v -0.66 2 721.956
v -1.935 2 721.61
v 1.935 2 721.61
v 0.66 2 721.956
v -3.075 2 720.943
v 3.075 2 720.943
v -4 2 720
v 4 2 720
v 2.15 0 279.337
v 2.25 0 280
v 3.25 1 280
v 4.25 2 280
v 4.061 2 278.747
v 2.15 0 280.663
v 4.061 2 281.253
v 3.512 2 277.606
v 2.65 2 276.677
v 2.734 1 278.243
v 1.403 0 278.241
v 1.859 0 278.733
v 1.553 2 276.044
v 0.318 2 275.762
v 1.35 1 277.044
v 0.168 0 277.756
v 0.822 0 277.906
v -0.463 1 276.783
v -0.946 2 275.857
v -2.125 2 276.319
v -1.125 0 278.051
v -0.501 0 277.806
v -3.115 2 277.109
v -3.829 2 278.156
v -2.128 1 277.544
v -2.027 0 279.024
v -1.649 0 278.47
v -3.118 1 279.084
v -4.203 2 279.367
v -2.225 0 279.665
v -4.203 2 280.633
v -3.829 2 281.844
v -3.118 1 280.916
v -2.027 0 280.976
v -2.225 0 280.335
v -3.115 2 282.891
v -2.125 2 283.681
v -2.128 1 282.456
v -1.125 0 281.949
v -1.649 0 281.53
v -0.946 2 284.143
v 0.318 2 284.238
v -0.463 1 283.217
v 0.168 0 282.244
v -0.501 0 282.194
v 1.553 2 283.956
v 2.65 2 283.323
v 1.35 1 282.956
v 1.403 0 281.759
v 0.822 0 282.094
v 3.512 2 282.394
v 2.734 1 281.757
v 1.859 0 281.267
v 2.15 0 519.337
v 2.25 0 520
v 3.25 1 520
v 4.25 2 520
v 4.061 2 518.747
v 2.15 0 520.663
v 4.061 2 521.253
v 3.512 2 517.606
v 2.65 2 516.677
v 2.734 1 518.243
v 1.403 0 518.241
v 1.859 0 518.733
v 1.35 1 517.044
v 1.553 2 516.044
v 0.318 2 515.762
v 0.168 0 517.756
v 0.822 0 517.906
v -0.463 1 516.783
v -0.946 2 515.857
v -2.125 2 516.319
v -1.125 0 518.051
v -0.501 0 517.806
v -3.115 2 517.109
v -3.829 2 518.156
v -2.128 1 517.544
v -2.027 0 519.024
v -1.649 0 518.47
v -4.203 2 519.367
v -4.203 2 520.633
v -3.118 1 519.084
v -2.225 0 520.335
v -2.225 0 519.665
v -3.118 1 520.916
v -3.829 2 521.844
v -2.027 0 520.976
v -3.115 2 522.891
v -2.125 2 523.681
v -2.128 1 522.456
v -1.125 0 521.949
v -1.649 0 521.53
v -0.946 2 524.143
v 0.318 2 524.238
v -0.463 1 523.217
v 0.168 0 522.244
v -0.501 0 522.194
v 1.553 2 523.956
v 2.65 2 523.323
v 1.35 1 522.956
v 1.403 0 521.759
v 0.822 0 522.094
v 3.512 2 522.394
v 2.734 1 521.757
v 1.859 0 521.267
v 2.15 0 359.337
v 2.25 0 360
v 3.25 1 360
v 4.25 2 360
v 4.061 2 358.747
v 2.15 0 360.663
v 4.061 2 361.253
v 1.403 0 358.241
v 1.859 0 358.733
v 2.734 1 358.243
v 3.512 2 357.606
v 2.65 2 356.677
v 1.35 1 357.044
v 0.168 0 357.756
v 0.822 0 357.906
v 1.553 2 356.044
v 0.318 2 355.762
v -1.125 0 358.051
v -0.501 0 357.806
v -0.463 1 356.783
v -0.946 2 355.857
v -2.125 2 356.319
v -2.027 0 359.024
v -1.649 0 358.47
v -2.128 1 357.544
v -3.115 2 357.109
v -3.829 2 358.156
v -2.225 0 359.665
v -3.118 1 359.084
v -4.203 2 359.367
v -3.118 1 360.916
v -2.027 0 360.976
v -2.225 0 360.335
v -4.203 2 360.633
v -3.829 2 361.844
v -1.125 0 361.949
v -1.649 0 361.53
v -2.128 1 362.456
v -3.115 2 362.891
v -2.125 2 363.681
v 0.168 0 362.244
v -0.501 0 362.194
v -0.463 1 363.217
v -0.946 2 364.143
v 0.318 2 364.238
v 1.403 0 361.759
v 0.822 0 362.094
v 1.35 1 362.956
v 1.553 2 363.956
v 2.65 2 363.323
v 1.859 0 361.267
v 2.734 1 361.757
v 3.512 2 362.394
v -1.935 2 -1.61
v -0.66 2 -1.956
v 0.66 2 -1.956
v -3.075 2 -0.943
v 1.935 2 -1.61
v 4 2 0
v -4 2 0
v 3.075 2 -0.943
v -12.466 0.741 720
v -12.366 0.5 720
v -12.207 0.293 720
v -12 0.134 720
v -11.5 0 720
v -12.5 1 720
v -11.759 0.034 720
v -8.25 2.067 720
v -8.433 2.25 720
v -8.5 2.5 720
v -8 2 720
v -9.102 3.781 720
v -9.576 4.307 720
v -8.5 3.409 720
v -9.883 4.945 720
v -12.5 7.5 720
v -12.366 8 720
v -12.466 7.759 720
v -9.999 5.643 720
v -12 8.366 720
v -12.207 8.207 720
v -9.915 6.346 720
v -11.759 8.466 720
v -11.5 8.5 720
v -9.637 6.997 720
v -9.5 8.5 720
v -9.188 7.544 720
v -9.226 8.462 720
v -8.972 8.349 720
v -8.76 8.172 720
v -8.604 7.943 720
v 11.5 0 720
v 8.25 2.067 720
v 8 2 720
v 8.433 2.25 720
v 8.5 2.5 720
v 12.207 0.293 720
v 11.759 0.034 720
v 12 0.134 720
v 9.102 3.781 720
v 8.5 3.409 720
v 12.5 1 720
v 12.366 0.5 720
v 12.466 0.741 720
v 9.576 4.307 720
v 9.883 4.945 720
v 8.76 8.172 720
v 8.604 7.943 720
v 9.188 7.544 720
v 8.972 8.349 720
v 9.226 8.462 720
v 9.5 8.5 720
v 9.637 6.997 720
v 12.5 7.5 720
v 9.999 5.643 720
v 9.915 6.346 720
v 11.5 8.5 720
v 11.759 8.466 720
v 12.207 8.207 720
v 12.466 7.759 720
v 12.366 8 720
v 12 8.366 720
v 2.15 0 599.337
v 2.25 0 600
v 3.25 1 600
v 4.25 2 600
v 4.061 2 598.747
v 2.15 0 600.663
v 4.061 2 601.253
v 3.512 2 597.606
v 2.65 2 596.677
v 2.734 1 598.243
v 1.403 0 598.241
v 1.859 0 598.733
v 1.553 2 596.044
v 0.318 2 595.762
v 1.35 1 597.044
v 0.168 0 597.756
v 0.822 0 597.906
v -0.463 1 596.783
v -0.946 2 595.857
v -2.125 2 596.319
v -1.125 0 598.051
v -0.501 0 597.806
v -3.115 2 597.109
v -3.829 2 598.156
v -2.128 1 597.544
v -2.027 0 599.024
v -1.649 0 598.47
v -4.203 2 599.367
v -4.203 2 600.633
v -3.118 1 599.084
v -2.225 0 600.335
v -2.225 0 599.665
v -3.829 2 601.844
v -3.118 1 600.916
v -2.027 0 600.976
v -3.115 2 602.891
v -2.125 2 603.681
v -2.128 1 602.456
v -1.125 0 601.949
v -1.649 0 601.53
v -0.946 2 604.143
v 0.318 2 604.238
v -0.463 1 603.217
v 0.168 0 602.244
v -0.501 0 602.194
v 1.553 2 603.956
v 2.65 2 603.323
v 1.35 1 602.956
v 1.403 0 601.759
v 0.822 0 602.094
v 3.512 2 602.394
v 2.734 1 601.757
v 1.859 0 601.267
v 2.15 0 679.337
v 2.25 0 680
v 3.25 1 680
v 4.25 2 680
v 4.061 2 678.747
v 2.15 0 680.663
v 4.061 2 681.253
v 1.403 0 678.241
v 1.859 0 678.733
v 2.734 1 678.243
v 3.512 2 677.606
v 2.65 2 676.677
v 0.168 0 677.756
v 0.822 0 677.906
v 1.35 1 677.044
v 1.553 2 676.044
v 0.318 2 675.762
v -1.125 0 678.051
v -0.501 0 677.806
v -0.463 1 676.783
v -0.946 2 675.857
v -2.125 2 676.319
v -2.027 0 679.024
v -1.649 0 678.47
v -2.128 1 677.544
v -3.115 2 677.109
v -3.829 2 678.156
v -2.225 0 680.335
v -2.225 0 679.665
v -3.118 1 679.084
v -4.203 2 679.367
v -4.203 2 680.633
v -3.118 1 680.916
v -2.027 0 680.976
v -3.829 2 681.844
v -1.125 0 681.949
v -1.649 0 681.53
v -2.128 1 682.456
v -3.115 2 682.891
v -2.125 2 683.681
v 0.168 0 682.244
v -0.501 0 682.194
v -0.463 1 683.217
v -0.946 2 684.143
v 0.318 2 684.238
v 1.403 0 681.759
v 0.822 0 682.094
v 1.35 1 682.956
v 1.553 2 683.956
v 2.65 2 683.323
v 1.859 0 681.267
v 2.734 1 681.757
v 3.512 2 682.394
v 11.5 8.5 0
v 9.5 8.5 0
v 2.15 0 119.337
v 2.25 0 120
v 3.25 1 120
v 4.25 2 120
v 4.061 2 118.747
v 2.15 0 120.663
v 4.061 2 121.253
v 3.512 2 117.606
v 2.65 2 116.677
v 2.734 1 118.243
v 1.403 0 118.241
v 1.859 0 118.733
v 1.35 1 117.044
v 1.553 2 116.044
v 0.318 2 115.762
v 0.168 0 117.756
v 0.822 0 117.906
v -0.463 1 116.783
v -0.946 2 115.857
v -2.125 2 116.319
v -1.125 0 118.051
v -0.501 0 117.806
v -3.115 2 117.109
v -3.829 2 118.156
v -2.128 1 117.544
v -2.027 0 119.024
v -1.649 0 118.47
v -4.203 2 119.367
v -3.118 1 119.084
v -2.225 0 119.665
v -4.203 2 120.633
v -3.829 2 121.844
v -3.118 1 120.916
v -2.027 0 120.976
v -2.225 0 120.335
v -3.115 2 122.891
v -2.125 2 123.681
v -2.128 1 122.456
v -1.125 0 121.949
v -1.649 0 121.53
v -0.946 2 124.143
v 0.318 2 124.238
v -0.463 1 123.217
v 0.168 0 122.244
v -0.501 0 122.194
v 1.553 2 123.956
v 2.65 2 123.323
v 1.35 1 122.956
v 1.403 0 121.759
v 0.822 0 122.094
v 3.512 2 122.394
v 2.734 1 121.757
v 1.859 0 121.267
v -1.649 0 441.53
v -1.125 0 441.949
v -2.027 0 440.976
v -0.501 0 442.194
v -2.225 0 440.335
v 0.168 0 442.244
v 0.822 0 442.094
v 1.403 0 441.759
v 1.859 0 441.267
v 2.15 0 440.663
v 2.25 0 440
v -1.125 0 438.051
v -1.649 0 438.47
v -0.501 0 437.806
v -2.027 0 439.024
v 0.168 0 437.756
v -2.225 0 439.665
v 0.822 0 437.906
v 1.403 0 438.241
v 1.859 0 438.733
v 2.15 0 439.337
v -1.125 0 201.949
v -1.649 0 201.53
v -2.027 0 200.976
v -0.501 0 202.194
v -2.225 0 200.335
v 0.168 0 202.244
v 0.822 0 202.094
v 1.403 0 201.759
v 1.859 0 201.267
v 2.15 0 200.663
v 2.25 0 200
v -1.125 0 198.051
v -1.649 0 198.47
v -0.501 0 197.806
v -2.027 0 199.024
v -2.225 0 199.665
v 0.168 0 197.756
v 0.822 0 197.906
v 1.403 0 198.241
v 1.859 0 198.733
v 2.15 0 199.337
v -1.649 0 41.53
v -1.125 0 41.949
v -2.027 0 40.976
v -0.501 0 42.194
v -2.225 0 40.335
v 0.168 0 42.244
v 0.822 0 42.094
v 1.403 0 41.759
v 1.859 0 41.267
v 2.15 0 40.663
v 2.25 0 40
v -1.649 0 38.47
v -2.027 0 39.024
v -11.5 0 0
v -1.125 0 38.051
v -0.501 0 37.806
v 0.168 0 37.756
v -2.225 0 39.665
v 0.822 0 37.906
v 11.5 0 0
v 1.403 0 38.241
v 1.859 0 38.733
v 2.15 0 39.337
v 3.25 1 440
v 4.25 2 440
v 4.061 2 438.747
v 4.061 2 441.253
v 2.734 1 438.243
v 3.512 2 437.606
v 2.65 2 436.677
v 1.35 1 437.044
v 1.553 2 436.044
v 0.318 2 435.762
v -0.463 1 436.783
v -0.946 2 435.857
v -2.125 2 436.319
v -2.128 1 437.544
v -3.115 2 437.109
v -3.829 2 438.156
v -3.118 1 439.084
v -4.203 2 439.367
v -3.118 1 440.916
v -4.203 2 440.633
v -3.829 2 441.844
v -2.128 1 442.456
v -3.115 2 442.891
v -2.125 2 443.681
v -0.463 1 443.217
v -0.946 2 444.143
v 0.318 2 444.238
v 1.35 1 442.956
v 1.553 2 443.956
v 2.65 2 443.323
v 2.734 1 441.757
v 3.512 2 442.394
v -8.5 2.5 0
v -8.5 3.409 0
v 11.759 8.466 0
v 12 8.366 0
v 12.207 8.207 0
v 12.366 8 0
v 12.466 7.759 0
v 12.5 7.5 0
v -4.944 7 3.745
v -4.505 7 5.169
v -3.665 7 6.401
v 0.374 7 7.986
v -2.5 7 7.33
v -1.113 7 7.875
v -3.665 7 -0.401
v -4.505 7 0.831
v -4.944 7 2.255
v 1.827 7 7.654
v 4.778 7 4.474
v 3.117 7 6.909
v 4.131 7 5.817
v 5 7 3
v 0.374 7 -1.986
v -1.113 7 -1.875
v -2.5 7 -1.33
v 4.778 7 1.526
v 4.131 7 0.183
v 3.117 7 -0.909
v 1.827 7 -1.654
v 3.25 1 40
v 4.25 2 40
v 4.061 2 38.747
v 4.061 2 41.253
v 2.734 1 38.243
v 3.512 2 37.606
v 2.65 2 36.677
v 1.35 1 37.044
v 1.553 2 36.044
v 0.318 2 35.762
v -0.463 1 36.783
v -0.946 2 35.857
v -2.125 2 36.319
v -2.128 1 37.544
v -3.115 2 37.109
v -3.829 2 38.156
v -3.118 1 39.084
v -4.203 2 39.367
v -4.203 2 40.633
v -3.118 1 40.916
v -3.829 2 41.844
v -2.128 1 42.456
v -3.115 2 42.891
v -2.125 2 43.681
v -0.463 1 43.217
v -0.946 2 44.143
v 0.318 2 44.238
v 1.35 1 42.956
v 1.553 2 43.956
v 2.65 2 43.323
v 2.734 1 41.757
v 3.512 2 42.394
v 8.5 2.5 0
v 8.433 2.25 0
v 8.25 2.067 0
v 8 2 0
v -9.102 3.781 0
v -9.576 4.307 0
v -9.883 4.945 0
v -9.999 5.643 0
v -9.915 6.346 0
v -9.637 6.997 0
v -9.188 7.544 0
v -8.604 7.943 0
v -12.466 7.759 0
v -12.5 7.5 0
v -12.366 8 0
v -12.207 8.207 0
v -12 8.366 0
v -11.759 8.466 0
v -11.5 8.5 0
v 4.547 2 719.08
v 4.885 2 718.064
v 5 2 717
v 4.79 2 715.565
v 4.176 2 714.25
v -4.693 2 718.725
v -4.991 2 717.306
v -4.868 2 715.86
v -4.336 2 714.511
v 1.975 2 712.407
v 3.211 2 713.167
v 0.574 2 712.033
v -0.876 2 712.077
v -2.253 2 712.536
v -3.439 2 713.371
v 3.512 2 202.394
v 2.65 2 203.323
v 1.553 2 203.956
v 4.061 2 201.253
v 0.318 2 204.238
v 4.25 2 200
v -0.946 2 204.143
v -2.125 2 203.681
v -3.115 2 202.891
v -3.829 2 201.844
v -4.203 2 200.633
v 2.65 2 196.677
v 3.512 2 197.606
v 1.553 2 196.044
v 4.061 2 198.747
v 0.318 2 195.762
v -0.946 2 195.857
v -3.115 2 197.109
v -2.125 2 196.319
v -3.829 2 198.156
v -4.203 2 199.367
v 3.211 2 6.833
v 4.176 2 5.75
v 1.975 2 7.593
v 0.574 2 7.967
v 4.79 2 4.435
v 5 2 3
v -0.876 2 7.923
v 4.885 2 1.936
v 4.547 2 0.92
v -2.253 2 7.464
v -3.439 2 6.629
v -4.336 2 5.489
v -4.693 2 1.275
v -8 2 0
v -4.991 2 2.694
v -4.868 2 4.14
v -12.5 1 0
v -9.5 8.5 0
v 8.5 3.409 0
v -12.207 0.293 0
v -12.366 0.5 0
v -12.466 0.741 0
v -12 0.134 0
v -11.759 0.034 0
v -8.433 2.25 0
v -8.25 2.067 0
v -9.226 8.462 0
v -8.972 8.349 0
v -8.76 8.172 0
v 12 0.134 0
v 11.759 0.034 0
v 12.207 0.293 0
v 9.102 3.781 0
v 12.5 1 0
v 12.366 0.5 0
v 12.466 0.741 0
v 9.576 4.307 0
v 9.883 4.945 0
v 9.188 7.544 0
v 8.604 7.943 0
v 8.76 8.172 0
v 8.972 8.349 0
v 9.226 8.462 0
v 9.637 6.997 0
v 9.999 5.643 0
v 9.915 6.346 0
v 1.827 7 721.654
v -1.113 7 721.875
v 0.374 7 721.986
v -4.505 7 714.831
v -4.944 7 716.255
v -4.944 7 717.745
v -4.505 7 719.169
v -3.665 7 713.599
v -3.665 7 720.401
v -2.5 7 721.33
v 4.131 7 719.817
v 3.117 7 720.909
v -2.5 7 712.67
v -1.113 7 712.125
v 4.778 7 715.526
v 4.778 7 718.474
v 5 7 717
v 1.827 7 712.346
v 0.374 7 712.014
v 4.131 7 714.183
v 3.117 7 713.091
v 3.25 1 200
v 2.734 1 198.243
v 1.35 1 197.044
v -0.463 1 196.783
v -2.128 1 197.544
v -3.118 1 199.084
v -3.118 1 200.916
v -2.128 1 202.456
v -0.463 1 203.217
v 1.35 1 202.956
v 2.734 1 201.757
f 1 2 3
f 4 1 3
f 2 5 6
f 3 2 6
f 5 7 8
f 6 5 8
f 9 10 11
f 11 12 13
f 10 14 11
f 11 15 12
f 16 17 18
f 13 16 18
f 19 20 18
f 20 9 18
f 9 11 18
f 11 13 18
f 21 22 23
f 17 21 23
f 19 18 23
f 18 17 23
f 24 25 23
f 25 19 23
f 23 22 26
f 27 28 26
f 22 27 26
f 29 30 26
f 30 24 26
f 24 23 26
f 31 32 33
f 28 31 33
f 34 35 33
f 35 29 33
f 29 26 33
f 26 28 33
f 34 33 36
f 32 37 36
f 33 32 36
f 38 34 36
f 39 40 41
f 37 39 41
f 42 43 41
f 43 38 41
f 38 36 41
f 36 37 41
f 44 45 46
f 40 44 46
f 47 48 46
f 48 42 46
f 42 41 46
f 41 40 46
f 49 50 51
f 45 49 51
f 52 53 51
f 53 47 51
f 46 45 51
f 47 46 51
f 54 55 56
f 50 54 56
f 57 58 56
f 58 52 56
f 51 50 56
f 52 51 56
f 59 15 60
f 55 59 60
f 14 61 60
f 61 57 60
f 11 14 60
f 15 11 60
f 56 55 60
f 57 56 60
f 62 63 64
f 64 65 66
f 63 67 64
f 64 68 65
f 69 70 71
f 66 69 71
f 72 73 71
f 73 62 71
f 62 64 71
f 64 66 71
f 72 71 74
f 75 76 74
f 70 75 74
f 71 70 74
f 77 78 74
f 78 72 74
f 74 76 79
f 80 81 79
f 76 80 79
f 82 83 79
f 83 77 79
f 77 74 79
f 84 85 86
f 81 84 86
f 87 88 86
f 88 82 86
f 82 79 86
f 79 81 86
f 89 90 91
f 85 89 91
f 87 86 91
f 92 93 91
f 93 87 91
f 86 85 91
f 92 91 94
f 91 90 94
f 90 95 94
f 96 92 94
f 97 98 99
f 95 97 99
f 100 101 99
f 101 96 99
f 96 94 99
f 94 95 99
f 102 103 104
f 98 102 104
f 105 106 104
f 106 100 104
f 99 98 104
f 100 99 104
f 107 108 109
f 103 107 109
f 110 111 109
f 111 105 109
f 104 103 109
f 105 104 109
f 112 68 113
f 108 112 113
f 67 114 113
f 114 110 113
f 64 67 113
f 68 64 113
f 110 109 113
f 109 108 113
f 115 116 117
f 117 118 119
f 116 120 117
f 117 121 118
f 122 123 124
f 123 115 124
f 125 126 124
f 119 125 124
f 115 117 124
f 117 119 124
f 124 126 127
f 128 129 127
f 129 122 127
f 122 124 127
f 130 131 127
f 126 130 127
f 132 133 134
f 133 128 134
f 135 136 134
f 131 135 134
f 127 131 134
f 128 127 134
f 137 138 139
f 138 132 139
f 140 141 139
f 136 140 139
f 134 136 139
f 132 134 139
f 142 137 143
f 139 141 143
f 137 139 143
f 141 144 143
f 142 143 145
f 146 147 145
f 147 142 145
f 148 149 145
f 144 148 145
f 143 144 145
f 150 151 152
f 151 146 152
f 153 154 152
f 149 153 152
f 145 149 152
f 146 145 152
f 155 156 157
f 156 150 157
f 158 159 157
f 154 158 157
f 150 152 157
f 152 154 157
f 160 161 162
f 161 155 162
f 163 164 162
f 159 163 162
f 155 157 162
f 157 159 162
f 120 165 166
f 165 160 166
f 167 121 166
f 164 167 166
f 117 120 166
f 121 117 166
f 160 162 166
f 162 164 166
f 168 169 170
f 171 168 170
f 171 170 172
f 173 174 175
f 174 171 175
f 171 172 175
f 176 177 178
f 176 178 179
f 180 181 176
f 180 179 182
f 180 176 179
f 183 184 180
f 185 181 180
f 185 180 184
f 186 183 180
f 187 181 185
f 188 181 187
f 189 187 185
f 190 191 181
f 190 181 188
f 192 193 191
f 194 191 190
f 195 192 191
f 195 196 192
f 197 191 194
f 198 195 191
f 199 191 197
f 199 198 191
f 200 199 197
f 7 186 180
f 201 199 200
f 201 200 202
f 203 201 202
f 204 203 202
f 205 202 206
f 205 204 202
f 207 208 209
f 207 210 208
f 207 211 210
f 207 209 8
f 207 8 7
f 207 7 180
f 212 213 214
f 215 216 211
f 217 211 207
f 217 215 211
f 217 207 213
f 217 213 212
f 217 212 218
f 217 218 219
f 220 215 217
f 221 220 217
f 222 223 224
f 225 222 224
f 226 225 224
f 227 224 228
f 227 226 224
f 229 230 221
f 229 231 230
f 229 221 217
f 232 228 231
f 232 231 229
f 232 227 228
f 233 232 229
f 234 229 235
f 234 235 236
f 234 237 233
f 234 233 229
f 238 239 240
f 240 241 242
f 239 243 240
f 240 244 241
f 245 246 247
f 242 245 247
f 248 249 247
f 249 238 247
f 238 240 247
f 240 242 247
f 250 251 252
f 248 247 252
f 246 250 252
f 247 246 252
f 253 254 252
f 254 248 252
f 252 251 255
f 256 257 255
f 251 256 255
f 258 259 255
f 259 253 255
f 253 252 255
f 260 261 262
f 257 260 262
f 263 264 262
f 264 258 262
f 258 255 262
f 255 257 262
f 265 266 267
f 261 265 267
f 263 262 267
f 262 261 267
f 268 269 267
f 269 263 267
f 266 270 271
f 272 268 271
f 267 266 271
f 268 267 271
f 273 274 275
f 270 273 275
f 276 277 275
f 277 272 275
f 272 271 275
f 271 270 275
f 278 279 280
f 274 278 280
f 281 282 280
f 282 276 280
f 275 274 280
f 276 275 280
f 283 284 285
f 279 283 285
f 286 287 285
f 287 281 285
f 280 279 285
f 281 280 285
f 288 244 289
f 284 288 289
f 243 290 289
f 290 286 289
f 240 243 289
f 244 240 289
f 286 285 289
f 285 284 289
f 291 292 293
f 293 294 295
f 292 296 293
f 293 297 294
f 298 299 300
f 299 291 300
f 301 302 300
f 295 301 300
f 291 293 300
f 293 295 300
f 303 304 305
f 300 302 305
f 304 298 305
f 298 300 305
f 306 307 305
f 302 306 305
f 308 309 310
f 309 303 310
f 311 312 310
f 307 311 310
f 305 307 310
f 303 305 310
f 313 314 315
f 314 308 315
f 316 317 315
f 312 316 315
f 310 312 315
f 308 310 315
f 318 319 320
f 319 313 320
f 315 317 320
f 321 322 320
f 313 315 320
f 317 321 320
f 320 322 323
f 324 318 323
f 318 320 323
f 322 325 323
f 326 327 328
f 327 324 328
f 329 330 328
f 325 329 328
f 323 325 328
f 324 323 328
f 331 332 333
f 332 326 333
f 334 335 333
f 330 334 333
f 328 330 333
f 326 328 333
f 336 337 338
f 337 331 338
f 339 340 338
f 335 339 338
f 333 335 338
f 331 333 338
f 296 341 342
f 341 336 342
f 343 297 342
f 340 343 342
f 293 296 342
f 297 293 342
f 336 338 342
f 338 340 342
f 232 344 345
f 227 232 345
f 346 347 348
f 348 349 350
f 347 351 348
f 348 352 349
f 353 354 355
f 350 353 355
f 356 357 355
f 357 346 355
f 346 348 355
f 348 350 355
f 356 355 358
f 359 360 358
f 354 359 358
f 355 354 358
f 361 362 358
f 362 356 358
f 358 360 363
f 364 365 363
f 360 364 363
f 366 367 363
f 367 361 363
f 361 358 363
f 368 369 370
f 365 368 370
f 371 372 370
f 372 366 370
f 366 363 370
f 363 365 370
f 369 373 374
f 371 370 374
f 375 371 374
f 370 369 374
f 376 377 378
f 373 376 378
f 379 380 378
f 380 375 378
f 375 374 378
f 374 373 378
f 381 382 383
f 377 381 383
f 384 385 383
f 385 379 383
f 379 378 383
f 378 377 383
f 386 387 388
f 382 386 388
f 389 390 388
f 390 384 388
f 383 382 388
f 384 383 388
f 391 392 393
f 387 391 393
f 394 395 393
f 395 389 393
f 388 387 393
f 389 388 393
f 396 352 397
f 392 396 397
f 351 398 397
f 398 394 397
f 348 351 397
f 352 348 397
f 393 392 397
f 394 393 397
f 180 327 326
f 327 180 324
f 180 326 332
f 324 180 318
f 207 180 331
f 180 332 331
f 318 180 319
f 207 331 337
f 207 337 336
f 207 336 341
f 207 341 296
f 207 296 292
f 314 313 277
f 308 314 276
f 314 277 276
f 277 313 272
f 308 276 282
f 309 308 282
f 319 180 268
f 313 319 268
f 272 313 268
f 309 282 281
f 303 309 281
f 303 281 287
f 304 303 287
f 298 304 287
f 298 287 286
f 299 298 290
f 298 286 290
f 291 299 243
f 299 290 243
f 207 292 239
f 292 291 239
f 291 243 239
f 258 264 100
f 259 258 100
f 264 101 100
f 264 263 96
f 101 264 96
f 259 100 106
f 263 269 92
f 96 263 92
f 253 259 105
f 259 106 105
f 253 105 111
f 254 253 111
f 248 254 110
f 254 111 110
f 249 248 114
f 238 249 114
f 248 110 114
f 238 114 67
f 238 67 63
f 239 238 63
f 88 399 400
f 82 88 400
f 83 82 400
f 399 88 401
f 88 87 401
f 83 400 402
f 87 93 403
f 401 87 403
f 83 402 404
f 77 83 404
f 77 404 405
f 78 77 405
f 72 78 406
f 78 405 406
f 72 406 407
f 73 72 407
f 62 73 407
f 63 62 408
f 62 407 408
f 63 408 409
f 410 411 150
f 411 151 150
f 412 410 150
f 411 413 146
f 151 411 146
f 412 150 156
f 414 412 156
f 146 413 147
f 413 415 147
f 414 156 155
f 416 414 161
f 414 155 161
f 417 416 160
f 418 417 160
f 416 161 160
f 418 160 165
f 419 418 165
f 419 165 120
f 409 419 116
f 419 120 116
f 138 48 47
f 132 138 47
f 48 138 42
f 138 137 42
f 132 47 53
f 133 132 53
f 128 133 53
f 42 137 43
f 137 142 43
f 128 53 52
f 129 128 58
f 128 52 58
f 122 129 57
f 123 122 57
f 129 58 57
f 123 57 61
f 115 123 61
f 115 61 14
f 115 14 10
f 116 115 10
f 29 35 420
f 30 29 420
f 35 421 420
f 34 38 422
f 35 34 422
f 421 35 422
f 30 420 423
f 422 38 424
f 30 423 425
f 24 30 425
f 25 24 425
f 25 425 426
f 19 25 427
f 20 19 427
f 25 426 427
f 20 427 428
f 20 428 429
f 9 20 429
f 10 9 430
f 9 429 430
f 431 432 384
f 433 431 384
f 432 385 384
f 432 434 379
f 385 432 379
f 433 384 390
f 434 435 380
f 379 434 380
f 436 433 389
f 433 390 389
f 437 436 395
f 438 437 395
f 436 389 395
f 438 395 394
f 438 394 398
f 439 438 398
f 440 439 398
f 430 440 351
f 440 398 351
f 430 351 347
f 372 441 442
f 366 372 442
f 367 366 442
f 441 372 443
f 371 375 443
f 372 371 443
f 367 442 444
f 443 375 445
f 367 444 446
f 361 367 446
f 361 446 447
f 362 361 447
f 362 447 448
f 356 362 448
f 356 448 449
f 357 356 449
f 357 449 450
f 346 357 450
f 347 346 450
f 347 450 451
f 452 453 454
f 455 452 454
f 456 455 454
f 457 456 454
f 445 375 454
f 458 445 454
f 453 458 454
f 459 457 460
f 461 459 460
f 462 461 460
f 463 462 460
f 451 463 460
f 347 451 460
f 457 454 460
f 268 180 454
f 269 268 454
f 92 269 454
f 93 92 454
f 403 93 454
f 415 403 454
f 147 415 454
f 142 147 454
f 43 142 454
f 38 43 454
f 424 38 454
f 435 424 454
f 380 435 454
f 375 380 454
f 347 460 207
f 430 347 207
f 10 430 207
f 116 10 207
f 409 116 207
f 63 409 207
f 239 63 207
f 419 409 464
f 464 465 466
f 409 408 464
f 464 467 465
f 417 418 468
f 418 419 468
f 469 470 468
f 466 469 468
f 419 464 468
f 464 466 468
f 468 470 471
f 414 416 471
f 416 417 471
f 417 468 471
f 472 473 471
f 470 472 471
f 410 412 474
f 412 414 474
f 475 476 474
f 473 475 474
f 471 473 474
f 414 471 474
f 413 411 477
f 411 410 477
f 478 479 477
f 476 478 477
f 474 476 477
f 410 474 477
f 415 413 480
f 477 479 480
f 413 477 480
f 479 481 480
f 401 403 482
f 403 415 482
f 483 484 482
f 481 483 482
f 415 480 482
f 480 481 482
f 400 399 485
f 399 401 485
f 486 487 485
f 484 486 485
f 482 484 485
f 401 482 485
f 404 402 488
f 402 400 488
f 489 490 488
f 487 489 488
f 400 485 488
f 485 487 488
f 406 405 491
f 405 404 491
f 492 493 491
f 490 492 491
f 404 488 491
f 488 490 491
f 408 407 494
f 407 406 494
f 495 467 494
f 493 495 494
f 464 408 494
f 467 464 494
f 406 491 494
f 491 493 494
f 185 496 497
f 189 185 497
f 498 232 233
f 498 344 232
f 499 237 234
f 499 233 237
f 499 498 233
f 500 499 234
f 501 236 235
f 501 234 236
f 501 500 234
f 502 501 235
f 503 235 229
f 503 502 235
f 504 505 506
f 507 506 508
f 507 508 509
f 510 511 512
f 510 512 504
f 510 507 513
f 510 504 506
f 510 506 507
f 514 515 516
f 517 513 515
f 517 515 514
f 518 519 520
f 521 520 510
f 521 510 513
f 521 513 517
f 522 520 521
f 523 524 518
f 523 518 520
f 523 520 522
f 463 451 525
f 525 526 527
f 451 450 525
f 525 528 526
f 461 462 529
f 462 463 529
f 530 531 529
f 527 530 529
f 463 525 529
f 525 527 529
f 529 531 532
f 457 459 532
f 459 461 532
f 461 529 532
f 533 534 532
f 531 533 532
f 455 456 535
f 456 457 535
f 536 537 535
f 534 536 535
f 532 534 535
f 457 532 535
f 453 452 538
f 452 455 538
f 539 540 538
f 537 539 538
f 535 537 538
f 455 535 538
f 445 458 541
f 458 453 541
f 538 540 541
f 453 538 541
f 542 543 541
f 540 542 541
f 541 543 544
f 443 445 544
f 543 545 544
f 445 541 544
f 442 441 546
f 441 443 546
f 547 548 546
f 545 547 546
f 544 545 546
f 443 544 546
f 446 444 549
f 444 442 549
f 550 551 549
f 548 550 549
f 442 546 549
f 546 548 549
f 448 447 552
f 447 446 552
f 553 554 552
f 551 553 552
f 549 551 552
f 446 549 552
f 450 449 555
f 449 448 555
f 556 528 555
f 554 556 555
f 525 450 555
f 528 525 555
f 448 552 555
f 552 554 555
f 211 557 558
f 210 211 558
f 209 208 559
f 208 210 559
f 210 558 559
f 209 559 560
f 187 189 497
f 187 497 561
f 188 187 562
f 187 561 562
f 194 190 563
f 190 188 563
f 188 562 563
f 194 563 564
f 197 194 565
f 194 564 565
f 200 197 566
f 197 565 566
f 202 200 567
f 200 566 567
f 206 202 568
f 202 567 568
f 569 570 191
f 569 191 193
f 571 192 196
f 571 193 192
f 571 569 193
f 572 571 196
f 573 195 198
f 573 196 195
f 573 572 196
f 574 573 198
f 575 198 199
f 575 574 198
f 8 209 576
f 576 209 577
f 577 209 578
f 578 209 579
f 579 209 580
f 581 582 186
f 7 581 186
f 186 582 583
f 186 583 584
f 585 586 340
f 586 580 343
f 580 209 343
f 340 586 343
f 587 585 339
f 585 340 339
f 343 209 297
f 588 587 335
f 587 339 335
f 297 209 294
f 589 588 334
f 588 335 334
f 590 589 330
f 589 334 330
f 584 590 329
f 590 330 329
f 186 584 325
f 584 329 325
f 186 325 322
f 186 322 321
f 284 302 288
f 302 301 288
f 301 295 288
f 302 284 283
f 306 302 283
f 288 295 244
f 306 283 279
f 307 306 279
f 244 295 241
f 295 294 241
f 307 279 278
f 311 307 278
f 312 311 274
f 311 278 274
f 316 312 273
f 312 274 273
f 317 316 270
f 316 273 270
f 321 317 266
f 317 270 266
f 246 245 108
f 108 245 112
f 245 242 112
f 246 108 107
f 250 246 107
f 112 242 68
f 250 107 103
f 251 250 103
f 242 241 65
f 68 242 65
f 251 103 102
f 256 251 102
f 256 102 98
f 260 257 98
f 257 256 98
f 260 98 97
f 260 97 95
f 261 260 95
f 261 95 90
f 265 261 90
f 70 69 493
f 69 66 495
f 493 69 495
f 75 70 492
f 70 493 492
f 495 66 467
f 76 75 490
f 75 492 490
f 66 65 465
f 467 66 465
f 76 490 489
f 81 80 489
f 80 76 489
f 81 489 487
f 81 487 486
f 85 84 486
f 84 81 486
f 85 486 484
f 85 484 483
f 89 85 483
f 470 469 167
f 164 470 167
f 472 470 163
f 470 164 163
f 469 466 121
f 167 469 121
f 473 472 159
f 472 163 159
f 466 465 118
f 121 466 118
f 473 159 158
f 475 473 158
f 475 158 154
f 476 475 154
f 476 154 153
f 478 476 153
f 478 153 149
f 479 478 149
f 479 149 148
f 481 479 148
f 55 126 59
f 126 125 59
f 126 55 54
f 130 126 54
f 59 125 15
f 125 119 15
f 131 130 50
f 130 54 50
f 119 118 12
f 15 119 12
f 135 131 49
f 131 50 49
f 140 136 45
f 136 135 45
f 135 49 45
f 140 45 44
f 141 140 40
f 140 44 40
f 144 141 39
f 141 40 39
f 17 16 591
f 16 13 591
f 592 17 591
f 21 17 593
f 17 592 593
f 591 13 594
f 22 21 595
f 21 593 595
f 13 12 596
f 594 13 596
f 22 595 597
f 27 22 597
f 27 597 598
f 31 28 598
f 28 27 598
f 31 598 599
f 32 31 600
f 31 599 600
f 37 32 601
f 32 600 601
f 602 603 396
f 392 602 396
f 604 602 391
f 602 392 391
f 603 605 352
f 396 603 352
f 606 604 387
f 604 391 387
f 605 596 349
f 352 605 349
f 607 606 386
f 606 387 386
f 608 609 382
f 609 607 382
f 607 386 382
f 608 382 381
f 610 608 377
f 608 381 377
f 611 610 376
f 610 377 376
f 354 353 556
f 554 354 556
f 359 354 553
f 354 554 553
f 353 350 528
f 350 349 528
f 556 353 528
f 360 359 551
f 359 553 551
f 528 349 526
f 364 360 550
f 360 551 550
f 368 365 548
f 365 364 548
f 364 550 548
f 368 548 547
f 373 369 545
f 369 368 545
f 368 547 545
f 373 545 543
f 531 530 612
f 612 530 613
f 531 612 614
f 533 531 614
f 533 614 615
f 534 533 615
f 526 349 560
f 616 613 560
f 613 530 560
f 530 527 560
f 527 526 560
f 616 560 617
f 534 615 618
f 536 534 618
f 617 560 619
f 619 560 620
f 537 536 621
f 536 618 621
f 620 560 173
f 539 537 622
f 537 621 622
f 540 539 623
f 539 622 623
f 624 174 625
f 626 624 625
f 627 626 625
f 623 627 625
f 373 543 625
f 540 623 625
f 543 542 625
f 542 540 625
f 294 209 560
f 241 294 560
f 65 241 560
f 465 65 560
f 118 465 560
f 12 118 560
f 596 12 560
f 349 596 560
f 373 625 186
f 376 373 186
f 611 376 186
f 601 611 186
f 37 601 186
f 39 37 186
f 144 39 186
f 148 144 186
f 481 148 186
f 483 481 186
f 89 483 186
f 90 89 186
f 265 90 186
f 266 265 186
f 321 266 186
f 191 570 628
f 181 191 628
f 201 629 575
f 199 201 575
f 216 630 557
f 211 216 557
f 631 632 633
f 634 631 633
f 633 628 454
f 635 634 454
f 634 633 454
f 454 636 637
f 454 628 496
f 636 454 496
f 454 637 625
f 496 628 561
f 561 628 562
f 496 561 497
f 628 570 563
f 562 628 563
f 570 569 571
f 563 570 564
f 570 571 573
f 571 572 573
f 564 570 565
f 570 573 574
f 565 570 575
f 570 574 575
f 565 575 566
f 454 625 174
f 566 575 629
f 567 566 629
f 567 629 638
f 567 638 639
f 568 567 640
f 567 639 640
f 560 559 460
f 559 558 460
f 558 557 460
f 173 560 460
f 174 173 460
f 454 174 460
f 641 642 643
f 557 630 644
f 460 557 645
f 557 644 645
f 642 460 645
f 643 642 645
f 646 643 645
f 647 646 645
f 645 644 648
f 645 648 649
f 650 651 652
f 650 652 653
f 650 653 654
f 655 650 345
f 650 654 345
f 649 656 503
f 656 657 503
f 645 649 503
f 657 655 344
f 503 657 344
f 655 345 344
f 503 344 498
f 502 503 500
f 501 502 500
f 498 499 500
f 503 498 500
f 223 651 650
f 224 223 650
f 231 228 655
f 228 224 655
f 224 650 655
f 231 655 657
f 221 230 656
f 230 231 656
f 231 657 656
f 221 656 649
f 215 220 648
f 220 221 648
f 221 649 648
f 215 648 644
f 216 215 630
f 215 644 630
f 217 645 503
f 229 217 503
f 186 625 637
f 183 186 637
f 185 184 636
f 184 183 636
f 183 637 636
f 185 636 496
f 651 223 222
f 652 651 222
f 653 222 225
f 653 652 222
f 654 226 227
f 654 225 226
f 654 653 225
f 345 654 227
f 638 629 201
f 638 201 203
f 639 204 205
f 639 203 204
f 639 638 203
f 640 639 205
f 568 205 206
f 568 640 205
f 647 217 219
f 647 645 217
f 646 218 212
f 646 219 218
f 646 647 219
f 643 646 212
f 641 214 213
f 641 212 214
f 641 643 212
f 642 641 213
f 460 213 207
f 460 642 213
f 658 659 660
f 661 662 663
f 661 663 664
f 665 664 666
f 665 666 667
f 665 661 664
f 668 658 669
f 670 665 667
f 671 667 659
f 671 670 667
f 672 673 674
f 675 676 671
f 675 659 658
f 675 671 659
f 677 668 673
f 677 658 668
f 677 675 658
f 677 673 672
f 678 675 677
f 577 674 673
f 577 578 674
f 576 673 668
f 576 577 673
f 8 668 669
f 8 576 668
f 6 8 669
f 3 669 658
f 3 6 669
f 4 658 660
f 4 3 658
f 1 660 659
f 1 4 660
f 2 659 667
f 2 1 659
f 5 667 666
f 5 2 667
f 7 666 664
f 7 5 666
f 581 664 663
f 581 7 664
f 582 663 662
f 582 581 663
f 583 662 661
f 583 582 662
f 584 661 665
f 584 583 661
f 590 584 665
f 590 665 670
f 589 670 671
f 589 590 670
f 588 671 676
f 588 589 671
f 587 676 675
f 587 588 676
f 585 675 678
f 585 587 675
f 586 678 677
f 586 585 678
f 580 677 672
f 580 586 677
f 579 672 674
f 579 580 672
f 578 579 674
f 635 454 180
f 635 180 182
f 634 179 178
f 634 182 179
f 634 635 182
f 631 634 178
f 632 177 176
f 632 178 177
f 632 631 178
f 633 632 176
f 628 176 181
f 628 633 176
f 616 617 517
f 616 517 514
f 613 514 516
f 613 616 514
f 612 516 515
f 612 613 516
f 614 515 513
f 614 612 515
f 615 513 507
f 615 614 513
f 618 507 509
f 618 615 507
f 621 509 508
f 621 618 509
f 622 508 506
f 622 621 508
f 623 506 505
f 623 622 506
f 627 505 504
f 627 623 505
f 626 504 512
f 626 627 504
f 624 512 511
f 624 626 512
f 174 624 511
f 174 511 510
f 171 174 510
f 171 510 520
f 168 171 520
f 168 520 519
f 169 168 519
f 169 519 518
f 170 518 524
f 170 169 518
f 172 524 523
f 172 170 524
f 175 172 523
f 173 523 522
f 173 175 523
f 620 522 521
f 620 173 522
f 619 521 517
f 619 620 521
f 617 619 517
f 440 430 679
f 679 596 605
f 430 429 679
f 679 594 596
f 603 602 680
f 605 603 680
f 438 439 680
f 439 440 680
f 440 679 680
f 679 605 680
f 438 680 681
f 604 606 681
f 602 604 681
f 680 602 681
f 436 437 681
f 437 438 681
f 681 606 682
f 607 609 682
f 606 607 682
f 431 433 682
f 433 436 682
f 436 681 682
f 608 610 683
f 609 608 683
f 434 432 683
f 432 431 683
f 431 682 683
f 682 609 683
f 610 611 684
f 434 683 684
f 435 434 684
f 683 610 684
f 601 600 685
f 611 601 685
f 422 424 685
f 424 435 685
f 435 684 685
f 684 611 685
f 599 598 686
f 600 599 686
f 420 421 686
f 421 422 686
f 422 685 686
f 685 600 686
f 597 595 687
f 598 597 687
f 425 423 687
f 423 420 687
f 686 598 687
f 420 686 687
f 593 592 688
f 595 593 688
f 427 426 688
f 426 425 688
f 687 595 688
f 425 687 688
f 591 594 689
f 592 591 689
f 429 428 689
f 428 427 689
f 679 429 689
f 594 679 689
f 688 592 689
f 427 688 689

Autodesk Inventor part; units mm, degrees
sketch "Sketch_1" plane through (0, 0, 0) normal (0, 0, 1) x (1, 0, 0)
  arc A0 (-12.5, 1) -> (-11.5, 0) centre (-11.5, 1) ccw
  line L0 (-11.5, 0) -> (11.5, 0)
  arc A1 (11.5, 0) -> (12.5, 1) centre (11.5, 1) ccw
  line L1 (12.5, 1) -> (12.5, 7.5)
  arc A2 (12.5, 7.5) -> (11.5, 8.5) centre (11.5, 7.5) ccw
  line L2 (11.5, 8.5) -> (9.5, 8.5)
  arc A3 (9.5, 8.5) -> (8.6036, 7.9432) centre (9.5, 7.5) ccw
  arc A4 (8.5, 3.4087) -> (8.6036, 7.9432) centre (7.5, 5.7) ccw
  line L3 (8.5, 3.4087) -> (8.5, 2.5)
  arc A5 (8, 2) -> (8.5, 2.5) centre (8, 2.5) ccw
  line L4 (8, 2) -> (-8, 2)
  arc A6 (-8.5, 2.5) -> (-8, 2) centre (-8, 2.5) ccw
  line L5 (-8.5, 2.5) -> (-8.5, 3.4087)
  arc A7 (-8.6036, 7.9432) -> (-8.5, 3.4087) centre (-7.5, 5.7) ccw
  arc A8 (-8.6036, 7.9432) -> (-9.5, 8.5) centre (-9.5, 7.5) ccw
  line L6 (-9.5, 8.5) -> (-11.5, 8.5)
  arc A9 (-11.5, 8.5) -> (-12.5, 7.5) centre (-11.5, 7.5) ccw
  line L7 (-12.5, 7.5) -> (-12.5, 1)
extrude "Extrusion1" add sketch "Sketch_1" along normal blind 720
sketch "Sketch_2" plane through (0, 0, 40) normal (0, 0, 1) x (1, 0, 0)
  line L0 (0, 0) -> (0, 2)
  line L1 (0, 2) -> (4.25, 2)
  line L2 (4.25, 2) -> (2.25, 0)
  line L3 (2.25, 0) -> (0, 0)
  line L4 (0, 0) -> (0, 2)
revolve "Revolution1" cut sketch "Sketch_2" angle 360 about axis through (0, 0, 40) along (0, -1, 0)
pattern_linear "Rectangular Pattern1" count 9 spacing 80 along (0, 0, 1) of "Revolution1"
sketch "Sketch_4" plane through (0, 2, 0) normal (0, 1, 0) x (1, 0, 0)
  circle A0 centre (0, -3) radius 5
extrude "Extrusion2" add sketch "Sketch_4" along normal blind 5
sketch "Sketch_5" plane through (0, 2, 0) normal (0, 1, 0) x (1, 0, 0)
  circle A0 centre (0, -717) radius 5
extrude "Extrusion3" add sketch "Sketch_5" along normal blind 5
ref_plane "rail25_to_dummy_XY" through (0, 0, 360) normal (0, 0, 1) x (1, 0, 0)
ref_plane "rail25_to_dummy_YZ" through (0, 0, 360) normal (1, 0, 0) x (0, 1, 0)
ref_plane "rail25_to_dummy_ZX" through (0, 0, 360) normal (0, 1, 0) x (0, 0, 1)
ref_plane "to_slider_XY" through (0, 12, 360) normal (0, 0, 1) x (1, 0, 0)
ref_plane "to_slider_YZ" through (0, 12, 360) normal (1, 0, 0) x (0, 1, 0)
ref_plane "to_slider_ZX" through (0, 12, 360) normal (0, 1, 0) x (0, 0, 1)
properties part number "RSRR25-720"
